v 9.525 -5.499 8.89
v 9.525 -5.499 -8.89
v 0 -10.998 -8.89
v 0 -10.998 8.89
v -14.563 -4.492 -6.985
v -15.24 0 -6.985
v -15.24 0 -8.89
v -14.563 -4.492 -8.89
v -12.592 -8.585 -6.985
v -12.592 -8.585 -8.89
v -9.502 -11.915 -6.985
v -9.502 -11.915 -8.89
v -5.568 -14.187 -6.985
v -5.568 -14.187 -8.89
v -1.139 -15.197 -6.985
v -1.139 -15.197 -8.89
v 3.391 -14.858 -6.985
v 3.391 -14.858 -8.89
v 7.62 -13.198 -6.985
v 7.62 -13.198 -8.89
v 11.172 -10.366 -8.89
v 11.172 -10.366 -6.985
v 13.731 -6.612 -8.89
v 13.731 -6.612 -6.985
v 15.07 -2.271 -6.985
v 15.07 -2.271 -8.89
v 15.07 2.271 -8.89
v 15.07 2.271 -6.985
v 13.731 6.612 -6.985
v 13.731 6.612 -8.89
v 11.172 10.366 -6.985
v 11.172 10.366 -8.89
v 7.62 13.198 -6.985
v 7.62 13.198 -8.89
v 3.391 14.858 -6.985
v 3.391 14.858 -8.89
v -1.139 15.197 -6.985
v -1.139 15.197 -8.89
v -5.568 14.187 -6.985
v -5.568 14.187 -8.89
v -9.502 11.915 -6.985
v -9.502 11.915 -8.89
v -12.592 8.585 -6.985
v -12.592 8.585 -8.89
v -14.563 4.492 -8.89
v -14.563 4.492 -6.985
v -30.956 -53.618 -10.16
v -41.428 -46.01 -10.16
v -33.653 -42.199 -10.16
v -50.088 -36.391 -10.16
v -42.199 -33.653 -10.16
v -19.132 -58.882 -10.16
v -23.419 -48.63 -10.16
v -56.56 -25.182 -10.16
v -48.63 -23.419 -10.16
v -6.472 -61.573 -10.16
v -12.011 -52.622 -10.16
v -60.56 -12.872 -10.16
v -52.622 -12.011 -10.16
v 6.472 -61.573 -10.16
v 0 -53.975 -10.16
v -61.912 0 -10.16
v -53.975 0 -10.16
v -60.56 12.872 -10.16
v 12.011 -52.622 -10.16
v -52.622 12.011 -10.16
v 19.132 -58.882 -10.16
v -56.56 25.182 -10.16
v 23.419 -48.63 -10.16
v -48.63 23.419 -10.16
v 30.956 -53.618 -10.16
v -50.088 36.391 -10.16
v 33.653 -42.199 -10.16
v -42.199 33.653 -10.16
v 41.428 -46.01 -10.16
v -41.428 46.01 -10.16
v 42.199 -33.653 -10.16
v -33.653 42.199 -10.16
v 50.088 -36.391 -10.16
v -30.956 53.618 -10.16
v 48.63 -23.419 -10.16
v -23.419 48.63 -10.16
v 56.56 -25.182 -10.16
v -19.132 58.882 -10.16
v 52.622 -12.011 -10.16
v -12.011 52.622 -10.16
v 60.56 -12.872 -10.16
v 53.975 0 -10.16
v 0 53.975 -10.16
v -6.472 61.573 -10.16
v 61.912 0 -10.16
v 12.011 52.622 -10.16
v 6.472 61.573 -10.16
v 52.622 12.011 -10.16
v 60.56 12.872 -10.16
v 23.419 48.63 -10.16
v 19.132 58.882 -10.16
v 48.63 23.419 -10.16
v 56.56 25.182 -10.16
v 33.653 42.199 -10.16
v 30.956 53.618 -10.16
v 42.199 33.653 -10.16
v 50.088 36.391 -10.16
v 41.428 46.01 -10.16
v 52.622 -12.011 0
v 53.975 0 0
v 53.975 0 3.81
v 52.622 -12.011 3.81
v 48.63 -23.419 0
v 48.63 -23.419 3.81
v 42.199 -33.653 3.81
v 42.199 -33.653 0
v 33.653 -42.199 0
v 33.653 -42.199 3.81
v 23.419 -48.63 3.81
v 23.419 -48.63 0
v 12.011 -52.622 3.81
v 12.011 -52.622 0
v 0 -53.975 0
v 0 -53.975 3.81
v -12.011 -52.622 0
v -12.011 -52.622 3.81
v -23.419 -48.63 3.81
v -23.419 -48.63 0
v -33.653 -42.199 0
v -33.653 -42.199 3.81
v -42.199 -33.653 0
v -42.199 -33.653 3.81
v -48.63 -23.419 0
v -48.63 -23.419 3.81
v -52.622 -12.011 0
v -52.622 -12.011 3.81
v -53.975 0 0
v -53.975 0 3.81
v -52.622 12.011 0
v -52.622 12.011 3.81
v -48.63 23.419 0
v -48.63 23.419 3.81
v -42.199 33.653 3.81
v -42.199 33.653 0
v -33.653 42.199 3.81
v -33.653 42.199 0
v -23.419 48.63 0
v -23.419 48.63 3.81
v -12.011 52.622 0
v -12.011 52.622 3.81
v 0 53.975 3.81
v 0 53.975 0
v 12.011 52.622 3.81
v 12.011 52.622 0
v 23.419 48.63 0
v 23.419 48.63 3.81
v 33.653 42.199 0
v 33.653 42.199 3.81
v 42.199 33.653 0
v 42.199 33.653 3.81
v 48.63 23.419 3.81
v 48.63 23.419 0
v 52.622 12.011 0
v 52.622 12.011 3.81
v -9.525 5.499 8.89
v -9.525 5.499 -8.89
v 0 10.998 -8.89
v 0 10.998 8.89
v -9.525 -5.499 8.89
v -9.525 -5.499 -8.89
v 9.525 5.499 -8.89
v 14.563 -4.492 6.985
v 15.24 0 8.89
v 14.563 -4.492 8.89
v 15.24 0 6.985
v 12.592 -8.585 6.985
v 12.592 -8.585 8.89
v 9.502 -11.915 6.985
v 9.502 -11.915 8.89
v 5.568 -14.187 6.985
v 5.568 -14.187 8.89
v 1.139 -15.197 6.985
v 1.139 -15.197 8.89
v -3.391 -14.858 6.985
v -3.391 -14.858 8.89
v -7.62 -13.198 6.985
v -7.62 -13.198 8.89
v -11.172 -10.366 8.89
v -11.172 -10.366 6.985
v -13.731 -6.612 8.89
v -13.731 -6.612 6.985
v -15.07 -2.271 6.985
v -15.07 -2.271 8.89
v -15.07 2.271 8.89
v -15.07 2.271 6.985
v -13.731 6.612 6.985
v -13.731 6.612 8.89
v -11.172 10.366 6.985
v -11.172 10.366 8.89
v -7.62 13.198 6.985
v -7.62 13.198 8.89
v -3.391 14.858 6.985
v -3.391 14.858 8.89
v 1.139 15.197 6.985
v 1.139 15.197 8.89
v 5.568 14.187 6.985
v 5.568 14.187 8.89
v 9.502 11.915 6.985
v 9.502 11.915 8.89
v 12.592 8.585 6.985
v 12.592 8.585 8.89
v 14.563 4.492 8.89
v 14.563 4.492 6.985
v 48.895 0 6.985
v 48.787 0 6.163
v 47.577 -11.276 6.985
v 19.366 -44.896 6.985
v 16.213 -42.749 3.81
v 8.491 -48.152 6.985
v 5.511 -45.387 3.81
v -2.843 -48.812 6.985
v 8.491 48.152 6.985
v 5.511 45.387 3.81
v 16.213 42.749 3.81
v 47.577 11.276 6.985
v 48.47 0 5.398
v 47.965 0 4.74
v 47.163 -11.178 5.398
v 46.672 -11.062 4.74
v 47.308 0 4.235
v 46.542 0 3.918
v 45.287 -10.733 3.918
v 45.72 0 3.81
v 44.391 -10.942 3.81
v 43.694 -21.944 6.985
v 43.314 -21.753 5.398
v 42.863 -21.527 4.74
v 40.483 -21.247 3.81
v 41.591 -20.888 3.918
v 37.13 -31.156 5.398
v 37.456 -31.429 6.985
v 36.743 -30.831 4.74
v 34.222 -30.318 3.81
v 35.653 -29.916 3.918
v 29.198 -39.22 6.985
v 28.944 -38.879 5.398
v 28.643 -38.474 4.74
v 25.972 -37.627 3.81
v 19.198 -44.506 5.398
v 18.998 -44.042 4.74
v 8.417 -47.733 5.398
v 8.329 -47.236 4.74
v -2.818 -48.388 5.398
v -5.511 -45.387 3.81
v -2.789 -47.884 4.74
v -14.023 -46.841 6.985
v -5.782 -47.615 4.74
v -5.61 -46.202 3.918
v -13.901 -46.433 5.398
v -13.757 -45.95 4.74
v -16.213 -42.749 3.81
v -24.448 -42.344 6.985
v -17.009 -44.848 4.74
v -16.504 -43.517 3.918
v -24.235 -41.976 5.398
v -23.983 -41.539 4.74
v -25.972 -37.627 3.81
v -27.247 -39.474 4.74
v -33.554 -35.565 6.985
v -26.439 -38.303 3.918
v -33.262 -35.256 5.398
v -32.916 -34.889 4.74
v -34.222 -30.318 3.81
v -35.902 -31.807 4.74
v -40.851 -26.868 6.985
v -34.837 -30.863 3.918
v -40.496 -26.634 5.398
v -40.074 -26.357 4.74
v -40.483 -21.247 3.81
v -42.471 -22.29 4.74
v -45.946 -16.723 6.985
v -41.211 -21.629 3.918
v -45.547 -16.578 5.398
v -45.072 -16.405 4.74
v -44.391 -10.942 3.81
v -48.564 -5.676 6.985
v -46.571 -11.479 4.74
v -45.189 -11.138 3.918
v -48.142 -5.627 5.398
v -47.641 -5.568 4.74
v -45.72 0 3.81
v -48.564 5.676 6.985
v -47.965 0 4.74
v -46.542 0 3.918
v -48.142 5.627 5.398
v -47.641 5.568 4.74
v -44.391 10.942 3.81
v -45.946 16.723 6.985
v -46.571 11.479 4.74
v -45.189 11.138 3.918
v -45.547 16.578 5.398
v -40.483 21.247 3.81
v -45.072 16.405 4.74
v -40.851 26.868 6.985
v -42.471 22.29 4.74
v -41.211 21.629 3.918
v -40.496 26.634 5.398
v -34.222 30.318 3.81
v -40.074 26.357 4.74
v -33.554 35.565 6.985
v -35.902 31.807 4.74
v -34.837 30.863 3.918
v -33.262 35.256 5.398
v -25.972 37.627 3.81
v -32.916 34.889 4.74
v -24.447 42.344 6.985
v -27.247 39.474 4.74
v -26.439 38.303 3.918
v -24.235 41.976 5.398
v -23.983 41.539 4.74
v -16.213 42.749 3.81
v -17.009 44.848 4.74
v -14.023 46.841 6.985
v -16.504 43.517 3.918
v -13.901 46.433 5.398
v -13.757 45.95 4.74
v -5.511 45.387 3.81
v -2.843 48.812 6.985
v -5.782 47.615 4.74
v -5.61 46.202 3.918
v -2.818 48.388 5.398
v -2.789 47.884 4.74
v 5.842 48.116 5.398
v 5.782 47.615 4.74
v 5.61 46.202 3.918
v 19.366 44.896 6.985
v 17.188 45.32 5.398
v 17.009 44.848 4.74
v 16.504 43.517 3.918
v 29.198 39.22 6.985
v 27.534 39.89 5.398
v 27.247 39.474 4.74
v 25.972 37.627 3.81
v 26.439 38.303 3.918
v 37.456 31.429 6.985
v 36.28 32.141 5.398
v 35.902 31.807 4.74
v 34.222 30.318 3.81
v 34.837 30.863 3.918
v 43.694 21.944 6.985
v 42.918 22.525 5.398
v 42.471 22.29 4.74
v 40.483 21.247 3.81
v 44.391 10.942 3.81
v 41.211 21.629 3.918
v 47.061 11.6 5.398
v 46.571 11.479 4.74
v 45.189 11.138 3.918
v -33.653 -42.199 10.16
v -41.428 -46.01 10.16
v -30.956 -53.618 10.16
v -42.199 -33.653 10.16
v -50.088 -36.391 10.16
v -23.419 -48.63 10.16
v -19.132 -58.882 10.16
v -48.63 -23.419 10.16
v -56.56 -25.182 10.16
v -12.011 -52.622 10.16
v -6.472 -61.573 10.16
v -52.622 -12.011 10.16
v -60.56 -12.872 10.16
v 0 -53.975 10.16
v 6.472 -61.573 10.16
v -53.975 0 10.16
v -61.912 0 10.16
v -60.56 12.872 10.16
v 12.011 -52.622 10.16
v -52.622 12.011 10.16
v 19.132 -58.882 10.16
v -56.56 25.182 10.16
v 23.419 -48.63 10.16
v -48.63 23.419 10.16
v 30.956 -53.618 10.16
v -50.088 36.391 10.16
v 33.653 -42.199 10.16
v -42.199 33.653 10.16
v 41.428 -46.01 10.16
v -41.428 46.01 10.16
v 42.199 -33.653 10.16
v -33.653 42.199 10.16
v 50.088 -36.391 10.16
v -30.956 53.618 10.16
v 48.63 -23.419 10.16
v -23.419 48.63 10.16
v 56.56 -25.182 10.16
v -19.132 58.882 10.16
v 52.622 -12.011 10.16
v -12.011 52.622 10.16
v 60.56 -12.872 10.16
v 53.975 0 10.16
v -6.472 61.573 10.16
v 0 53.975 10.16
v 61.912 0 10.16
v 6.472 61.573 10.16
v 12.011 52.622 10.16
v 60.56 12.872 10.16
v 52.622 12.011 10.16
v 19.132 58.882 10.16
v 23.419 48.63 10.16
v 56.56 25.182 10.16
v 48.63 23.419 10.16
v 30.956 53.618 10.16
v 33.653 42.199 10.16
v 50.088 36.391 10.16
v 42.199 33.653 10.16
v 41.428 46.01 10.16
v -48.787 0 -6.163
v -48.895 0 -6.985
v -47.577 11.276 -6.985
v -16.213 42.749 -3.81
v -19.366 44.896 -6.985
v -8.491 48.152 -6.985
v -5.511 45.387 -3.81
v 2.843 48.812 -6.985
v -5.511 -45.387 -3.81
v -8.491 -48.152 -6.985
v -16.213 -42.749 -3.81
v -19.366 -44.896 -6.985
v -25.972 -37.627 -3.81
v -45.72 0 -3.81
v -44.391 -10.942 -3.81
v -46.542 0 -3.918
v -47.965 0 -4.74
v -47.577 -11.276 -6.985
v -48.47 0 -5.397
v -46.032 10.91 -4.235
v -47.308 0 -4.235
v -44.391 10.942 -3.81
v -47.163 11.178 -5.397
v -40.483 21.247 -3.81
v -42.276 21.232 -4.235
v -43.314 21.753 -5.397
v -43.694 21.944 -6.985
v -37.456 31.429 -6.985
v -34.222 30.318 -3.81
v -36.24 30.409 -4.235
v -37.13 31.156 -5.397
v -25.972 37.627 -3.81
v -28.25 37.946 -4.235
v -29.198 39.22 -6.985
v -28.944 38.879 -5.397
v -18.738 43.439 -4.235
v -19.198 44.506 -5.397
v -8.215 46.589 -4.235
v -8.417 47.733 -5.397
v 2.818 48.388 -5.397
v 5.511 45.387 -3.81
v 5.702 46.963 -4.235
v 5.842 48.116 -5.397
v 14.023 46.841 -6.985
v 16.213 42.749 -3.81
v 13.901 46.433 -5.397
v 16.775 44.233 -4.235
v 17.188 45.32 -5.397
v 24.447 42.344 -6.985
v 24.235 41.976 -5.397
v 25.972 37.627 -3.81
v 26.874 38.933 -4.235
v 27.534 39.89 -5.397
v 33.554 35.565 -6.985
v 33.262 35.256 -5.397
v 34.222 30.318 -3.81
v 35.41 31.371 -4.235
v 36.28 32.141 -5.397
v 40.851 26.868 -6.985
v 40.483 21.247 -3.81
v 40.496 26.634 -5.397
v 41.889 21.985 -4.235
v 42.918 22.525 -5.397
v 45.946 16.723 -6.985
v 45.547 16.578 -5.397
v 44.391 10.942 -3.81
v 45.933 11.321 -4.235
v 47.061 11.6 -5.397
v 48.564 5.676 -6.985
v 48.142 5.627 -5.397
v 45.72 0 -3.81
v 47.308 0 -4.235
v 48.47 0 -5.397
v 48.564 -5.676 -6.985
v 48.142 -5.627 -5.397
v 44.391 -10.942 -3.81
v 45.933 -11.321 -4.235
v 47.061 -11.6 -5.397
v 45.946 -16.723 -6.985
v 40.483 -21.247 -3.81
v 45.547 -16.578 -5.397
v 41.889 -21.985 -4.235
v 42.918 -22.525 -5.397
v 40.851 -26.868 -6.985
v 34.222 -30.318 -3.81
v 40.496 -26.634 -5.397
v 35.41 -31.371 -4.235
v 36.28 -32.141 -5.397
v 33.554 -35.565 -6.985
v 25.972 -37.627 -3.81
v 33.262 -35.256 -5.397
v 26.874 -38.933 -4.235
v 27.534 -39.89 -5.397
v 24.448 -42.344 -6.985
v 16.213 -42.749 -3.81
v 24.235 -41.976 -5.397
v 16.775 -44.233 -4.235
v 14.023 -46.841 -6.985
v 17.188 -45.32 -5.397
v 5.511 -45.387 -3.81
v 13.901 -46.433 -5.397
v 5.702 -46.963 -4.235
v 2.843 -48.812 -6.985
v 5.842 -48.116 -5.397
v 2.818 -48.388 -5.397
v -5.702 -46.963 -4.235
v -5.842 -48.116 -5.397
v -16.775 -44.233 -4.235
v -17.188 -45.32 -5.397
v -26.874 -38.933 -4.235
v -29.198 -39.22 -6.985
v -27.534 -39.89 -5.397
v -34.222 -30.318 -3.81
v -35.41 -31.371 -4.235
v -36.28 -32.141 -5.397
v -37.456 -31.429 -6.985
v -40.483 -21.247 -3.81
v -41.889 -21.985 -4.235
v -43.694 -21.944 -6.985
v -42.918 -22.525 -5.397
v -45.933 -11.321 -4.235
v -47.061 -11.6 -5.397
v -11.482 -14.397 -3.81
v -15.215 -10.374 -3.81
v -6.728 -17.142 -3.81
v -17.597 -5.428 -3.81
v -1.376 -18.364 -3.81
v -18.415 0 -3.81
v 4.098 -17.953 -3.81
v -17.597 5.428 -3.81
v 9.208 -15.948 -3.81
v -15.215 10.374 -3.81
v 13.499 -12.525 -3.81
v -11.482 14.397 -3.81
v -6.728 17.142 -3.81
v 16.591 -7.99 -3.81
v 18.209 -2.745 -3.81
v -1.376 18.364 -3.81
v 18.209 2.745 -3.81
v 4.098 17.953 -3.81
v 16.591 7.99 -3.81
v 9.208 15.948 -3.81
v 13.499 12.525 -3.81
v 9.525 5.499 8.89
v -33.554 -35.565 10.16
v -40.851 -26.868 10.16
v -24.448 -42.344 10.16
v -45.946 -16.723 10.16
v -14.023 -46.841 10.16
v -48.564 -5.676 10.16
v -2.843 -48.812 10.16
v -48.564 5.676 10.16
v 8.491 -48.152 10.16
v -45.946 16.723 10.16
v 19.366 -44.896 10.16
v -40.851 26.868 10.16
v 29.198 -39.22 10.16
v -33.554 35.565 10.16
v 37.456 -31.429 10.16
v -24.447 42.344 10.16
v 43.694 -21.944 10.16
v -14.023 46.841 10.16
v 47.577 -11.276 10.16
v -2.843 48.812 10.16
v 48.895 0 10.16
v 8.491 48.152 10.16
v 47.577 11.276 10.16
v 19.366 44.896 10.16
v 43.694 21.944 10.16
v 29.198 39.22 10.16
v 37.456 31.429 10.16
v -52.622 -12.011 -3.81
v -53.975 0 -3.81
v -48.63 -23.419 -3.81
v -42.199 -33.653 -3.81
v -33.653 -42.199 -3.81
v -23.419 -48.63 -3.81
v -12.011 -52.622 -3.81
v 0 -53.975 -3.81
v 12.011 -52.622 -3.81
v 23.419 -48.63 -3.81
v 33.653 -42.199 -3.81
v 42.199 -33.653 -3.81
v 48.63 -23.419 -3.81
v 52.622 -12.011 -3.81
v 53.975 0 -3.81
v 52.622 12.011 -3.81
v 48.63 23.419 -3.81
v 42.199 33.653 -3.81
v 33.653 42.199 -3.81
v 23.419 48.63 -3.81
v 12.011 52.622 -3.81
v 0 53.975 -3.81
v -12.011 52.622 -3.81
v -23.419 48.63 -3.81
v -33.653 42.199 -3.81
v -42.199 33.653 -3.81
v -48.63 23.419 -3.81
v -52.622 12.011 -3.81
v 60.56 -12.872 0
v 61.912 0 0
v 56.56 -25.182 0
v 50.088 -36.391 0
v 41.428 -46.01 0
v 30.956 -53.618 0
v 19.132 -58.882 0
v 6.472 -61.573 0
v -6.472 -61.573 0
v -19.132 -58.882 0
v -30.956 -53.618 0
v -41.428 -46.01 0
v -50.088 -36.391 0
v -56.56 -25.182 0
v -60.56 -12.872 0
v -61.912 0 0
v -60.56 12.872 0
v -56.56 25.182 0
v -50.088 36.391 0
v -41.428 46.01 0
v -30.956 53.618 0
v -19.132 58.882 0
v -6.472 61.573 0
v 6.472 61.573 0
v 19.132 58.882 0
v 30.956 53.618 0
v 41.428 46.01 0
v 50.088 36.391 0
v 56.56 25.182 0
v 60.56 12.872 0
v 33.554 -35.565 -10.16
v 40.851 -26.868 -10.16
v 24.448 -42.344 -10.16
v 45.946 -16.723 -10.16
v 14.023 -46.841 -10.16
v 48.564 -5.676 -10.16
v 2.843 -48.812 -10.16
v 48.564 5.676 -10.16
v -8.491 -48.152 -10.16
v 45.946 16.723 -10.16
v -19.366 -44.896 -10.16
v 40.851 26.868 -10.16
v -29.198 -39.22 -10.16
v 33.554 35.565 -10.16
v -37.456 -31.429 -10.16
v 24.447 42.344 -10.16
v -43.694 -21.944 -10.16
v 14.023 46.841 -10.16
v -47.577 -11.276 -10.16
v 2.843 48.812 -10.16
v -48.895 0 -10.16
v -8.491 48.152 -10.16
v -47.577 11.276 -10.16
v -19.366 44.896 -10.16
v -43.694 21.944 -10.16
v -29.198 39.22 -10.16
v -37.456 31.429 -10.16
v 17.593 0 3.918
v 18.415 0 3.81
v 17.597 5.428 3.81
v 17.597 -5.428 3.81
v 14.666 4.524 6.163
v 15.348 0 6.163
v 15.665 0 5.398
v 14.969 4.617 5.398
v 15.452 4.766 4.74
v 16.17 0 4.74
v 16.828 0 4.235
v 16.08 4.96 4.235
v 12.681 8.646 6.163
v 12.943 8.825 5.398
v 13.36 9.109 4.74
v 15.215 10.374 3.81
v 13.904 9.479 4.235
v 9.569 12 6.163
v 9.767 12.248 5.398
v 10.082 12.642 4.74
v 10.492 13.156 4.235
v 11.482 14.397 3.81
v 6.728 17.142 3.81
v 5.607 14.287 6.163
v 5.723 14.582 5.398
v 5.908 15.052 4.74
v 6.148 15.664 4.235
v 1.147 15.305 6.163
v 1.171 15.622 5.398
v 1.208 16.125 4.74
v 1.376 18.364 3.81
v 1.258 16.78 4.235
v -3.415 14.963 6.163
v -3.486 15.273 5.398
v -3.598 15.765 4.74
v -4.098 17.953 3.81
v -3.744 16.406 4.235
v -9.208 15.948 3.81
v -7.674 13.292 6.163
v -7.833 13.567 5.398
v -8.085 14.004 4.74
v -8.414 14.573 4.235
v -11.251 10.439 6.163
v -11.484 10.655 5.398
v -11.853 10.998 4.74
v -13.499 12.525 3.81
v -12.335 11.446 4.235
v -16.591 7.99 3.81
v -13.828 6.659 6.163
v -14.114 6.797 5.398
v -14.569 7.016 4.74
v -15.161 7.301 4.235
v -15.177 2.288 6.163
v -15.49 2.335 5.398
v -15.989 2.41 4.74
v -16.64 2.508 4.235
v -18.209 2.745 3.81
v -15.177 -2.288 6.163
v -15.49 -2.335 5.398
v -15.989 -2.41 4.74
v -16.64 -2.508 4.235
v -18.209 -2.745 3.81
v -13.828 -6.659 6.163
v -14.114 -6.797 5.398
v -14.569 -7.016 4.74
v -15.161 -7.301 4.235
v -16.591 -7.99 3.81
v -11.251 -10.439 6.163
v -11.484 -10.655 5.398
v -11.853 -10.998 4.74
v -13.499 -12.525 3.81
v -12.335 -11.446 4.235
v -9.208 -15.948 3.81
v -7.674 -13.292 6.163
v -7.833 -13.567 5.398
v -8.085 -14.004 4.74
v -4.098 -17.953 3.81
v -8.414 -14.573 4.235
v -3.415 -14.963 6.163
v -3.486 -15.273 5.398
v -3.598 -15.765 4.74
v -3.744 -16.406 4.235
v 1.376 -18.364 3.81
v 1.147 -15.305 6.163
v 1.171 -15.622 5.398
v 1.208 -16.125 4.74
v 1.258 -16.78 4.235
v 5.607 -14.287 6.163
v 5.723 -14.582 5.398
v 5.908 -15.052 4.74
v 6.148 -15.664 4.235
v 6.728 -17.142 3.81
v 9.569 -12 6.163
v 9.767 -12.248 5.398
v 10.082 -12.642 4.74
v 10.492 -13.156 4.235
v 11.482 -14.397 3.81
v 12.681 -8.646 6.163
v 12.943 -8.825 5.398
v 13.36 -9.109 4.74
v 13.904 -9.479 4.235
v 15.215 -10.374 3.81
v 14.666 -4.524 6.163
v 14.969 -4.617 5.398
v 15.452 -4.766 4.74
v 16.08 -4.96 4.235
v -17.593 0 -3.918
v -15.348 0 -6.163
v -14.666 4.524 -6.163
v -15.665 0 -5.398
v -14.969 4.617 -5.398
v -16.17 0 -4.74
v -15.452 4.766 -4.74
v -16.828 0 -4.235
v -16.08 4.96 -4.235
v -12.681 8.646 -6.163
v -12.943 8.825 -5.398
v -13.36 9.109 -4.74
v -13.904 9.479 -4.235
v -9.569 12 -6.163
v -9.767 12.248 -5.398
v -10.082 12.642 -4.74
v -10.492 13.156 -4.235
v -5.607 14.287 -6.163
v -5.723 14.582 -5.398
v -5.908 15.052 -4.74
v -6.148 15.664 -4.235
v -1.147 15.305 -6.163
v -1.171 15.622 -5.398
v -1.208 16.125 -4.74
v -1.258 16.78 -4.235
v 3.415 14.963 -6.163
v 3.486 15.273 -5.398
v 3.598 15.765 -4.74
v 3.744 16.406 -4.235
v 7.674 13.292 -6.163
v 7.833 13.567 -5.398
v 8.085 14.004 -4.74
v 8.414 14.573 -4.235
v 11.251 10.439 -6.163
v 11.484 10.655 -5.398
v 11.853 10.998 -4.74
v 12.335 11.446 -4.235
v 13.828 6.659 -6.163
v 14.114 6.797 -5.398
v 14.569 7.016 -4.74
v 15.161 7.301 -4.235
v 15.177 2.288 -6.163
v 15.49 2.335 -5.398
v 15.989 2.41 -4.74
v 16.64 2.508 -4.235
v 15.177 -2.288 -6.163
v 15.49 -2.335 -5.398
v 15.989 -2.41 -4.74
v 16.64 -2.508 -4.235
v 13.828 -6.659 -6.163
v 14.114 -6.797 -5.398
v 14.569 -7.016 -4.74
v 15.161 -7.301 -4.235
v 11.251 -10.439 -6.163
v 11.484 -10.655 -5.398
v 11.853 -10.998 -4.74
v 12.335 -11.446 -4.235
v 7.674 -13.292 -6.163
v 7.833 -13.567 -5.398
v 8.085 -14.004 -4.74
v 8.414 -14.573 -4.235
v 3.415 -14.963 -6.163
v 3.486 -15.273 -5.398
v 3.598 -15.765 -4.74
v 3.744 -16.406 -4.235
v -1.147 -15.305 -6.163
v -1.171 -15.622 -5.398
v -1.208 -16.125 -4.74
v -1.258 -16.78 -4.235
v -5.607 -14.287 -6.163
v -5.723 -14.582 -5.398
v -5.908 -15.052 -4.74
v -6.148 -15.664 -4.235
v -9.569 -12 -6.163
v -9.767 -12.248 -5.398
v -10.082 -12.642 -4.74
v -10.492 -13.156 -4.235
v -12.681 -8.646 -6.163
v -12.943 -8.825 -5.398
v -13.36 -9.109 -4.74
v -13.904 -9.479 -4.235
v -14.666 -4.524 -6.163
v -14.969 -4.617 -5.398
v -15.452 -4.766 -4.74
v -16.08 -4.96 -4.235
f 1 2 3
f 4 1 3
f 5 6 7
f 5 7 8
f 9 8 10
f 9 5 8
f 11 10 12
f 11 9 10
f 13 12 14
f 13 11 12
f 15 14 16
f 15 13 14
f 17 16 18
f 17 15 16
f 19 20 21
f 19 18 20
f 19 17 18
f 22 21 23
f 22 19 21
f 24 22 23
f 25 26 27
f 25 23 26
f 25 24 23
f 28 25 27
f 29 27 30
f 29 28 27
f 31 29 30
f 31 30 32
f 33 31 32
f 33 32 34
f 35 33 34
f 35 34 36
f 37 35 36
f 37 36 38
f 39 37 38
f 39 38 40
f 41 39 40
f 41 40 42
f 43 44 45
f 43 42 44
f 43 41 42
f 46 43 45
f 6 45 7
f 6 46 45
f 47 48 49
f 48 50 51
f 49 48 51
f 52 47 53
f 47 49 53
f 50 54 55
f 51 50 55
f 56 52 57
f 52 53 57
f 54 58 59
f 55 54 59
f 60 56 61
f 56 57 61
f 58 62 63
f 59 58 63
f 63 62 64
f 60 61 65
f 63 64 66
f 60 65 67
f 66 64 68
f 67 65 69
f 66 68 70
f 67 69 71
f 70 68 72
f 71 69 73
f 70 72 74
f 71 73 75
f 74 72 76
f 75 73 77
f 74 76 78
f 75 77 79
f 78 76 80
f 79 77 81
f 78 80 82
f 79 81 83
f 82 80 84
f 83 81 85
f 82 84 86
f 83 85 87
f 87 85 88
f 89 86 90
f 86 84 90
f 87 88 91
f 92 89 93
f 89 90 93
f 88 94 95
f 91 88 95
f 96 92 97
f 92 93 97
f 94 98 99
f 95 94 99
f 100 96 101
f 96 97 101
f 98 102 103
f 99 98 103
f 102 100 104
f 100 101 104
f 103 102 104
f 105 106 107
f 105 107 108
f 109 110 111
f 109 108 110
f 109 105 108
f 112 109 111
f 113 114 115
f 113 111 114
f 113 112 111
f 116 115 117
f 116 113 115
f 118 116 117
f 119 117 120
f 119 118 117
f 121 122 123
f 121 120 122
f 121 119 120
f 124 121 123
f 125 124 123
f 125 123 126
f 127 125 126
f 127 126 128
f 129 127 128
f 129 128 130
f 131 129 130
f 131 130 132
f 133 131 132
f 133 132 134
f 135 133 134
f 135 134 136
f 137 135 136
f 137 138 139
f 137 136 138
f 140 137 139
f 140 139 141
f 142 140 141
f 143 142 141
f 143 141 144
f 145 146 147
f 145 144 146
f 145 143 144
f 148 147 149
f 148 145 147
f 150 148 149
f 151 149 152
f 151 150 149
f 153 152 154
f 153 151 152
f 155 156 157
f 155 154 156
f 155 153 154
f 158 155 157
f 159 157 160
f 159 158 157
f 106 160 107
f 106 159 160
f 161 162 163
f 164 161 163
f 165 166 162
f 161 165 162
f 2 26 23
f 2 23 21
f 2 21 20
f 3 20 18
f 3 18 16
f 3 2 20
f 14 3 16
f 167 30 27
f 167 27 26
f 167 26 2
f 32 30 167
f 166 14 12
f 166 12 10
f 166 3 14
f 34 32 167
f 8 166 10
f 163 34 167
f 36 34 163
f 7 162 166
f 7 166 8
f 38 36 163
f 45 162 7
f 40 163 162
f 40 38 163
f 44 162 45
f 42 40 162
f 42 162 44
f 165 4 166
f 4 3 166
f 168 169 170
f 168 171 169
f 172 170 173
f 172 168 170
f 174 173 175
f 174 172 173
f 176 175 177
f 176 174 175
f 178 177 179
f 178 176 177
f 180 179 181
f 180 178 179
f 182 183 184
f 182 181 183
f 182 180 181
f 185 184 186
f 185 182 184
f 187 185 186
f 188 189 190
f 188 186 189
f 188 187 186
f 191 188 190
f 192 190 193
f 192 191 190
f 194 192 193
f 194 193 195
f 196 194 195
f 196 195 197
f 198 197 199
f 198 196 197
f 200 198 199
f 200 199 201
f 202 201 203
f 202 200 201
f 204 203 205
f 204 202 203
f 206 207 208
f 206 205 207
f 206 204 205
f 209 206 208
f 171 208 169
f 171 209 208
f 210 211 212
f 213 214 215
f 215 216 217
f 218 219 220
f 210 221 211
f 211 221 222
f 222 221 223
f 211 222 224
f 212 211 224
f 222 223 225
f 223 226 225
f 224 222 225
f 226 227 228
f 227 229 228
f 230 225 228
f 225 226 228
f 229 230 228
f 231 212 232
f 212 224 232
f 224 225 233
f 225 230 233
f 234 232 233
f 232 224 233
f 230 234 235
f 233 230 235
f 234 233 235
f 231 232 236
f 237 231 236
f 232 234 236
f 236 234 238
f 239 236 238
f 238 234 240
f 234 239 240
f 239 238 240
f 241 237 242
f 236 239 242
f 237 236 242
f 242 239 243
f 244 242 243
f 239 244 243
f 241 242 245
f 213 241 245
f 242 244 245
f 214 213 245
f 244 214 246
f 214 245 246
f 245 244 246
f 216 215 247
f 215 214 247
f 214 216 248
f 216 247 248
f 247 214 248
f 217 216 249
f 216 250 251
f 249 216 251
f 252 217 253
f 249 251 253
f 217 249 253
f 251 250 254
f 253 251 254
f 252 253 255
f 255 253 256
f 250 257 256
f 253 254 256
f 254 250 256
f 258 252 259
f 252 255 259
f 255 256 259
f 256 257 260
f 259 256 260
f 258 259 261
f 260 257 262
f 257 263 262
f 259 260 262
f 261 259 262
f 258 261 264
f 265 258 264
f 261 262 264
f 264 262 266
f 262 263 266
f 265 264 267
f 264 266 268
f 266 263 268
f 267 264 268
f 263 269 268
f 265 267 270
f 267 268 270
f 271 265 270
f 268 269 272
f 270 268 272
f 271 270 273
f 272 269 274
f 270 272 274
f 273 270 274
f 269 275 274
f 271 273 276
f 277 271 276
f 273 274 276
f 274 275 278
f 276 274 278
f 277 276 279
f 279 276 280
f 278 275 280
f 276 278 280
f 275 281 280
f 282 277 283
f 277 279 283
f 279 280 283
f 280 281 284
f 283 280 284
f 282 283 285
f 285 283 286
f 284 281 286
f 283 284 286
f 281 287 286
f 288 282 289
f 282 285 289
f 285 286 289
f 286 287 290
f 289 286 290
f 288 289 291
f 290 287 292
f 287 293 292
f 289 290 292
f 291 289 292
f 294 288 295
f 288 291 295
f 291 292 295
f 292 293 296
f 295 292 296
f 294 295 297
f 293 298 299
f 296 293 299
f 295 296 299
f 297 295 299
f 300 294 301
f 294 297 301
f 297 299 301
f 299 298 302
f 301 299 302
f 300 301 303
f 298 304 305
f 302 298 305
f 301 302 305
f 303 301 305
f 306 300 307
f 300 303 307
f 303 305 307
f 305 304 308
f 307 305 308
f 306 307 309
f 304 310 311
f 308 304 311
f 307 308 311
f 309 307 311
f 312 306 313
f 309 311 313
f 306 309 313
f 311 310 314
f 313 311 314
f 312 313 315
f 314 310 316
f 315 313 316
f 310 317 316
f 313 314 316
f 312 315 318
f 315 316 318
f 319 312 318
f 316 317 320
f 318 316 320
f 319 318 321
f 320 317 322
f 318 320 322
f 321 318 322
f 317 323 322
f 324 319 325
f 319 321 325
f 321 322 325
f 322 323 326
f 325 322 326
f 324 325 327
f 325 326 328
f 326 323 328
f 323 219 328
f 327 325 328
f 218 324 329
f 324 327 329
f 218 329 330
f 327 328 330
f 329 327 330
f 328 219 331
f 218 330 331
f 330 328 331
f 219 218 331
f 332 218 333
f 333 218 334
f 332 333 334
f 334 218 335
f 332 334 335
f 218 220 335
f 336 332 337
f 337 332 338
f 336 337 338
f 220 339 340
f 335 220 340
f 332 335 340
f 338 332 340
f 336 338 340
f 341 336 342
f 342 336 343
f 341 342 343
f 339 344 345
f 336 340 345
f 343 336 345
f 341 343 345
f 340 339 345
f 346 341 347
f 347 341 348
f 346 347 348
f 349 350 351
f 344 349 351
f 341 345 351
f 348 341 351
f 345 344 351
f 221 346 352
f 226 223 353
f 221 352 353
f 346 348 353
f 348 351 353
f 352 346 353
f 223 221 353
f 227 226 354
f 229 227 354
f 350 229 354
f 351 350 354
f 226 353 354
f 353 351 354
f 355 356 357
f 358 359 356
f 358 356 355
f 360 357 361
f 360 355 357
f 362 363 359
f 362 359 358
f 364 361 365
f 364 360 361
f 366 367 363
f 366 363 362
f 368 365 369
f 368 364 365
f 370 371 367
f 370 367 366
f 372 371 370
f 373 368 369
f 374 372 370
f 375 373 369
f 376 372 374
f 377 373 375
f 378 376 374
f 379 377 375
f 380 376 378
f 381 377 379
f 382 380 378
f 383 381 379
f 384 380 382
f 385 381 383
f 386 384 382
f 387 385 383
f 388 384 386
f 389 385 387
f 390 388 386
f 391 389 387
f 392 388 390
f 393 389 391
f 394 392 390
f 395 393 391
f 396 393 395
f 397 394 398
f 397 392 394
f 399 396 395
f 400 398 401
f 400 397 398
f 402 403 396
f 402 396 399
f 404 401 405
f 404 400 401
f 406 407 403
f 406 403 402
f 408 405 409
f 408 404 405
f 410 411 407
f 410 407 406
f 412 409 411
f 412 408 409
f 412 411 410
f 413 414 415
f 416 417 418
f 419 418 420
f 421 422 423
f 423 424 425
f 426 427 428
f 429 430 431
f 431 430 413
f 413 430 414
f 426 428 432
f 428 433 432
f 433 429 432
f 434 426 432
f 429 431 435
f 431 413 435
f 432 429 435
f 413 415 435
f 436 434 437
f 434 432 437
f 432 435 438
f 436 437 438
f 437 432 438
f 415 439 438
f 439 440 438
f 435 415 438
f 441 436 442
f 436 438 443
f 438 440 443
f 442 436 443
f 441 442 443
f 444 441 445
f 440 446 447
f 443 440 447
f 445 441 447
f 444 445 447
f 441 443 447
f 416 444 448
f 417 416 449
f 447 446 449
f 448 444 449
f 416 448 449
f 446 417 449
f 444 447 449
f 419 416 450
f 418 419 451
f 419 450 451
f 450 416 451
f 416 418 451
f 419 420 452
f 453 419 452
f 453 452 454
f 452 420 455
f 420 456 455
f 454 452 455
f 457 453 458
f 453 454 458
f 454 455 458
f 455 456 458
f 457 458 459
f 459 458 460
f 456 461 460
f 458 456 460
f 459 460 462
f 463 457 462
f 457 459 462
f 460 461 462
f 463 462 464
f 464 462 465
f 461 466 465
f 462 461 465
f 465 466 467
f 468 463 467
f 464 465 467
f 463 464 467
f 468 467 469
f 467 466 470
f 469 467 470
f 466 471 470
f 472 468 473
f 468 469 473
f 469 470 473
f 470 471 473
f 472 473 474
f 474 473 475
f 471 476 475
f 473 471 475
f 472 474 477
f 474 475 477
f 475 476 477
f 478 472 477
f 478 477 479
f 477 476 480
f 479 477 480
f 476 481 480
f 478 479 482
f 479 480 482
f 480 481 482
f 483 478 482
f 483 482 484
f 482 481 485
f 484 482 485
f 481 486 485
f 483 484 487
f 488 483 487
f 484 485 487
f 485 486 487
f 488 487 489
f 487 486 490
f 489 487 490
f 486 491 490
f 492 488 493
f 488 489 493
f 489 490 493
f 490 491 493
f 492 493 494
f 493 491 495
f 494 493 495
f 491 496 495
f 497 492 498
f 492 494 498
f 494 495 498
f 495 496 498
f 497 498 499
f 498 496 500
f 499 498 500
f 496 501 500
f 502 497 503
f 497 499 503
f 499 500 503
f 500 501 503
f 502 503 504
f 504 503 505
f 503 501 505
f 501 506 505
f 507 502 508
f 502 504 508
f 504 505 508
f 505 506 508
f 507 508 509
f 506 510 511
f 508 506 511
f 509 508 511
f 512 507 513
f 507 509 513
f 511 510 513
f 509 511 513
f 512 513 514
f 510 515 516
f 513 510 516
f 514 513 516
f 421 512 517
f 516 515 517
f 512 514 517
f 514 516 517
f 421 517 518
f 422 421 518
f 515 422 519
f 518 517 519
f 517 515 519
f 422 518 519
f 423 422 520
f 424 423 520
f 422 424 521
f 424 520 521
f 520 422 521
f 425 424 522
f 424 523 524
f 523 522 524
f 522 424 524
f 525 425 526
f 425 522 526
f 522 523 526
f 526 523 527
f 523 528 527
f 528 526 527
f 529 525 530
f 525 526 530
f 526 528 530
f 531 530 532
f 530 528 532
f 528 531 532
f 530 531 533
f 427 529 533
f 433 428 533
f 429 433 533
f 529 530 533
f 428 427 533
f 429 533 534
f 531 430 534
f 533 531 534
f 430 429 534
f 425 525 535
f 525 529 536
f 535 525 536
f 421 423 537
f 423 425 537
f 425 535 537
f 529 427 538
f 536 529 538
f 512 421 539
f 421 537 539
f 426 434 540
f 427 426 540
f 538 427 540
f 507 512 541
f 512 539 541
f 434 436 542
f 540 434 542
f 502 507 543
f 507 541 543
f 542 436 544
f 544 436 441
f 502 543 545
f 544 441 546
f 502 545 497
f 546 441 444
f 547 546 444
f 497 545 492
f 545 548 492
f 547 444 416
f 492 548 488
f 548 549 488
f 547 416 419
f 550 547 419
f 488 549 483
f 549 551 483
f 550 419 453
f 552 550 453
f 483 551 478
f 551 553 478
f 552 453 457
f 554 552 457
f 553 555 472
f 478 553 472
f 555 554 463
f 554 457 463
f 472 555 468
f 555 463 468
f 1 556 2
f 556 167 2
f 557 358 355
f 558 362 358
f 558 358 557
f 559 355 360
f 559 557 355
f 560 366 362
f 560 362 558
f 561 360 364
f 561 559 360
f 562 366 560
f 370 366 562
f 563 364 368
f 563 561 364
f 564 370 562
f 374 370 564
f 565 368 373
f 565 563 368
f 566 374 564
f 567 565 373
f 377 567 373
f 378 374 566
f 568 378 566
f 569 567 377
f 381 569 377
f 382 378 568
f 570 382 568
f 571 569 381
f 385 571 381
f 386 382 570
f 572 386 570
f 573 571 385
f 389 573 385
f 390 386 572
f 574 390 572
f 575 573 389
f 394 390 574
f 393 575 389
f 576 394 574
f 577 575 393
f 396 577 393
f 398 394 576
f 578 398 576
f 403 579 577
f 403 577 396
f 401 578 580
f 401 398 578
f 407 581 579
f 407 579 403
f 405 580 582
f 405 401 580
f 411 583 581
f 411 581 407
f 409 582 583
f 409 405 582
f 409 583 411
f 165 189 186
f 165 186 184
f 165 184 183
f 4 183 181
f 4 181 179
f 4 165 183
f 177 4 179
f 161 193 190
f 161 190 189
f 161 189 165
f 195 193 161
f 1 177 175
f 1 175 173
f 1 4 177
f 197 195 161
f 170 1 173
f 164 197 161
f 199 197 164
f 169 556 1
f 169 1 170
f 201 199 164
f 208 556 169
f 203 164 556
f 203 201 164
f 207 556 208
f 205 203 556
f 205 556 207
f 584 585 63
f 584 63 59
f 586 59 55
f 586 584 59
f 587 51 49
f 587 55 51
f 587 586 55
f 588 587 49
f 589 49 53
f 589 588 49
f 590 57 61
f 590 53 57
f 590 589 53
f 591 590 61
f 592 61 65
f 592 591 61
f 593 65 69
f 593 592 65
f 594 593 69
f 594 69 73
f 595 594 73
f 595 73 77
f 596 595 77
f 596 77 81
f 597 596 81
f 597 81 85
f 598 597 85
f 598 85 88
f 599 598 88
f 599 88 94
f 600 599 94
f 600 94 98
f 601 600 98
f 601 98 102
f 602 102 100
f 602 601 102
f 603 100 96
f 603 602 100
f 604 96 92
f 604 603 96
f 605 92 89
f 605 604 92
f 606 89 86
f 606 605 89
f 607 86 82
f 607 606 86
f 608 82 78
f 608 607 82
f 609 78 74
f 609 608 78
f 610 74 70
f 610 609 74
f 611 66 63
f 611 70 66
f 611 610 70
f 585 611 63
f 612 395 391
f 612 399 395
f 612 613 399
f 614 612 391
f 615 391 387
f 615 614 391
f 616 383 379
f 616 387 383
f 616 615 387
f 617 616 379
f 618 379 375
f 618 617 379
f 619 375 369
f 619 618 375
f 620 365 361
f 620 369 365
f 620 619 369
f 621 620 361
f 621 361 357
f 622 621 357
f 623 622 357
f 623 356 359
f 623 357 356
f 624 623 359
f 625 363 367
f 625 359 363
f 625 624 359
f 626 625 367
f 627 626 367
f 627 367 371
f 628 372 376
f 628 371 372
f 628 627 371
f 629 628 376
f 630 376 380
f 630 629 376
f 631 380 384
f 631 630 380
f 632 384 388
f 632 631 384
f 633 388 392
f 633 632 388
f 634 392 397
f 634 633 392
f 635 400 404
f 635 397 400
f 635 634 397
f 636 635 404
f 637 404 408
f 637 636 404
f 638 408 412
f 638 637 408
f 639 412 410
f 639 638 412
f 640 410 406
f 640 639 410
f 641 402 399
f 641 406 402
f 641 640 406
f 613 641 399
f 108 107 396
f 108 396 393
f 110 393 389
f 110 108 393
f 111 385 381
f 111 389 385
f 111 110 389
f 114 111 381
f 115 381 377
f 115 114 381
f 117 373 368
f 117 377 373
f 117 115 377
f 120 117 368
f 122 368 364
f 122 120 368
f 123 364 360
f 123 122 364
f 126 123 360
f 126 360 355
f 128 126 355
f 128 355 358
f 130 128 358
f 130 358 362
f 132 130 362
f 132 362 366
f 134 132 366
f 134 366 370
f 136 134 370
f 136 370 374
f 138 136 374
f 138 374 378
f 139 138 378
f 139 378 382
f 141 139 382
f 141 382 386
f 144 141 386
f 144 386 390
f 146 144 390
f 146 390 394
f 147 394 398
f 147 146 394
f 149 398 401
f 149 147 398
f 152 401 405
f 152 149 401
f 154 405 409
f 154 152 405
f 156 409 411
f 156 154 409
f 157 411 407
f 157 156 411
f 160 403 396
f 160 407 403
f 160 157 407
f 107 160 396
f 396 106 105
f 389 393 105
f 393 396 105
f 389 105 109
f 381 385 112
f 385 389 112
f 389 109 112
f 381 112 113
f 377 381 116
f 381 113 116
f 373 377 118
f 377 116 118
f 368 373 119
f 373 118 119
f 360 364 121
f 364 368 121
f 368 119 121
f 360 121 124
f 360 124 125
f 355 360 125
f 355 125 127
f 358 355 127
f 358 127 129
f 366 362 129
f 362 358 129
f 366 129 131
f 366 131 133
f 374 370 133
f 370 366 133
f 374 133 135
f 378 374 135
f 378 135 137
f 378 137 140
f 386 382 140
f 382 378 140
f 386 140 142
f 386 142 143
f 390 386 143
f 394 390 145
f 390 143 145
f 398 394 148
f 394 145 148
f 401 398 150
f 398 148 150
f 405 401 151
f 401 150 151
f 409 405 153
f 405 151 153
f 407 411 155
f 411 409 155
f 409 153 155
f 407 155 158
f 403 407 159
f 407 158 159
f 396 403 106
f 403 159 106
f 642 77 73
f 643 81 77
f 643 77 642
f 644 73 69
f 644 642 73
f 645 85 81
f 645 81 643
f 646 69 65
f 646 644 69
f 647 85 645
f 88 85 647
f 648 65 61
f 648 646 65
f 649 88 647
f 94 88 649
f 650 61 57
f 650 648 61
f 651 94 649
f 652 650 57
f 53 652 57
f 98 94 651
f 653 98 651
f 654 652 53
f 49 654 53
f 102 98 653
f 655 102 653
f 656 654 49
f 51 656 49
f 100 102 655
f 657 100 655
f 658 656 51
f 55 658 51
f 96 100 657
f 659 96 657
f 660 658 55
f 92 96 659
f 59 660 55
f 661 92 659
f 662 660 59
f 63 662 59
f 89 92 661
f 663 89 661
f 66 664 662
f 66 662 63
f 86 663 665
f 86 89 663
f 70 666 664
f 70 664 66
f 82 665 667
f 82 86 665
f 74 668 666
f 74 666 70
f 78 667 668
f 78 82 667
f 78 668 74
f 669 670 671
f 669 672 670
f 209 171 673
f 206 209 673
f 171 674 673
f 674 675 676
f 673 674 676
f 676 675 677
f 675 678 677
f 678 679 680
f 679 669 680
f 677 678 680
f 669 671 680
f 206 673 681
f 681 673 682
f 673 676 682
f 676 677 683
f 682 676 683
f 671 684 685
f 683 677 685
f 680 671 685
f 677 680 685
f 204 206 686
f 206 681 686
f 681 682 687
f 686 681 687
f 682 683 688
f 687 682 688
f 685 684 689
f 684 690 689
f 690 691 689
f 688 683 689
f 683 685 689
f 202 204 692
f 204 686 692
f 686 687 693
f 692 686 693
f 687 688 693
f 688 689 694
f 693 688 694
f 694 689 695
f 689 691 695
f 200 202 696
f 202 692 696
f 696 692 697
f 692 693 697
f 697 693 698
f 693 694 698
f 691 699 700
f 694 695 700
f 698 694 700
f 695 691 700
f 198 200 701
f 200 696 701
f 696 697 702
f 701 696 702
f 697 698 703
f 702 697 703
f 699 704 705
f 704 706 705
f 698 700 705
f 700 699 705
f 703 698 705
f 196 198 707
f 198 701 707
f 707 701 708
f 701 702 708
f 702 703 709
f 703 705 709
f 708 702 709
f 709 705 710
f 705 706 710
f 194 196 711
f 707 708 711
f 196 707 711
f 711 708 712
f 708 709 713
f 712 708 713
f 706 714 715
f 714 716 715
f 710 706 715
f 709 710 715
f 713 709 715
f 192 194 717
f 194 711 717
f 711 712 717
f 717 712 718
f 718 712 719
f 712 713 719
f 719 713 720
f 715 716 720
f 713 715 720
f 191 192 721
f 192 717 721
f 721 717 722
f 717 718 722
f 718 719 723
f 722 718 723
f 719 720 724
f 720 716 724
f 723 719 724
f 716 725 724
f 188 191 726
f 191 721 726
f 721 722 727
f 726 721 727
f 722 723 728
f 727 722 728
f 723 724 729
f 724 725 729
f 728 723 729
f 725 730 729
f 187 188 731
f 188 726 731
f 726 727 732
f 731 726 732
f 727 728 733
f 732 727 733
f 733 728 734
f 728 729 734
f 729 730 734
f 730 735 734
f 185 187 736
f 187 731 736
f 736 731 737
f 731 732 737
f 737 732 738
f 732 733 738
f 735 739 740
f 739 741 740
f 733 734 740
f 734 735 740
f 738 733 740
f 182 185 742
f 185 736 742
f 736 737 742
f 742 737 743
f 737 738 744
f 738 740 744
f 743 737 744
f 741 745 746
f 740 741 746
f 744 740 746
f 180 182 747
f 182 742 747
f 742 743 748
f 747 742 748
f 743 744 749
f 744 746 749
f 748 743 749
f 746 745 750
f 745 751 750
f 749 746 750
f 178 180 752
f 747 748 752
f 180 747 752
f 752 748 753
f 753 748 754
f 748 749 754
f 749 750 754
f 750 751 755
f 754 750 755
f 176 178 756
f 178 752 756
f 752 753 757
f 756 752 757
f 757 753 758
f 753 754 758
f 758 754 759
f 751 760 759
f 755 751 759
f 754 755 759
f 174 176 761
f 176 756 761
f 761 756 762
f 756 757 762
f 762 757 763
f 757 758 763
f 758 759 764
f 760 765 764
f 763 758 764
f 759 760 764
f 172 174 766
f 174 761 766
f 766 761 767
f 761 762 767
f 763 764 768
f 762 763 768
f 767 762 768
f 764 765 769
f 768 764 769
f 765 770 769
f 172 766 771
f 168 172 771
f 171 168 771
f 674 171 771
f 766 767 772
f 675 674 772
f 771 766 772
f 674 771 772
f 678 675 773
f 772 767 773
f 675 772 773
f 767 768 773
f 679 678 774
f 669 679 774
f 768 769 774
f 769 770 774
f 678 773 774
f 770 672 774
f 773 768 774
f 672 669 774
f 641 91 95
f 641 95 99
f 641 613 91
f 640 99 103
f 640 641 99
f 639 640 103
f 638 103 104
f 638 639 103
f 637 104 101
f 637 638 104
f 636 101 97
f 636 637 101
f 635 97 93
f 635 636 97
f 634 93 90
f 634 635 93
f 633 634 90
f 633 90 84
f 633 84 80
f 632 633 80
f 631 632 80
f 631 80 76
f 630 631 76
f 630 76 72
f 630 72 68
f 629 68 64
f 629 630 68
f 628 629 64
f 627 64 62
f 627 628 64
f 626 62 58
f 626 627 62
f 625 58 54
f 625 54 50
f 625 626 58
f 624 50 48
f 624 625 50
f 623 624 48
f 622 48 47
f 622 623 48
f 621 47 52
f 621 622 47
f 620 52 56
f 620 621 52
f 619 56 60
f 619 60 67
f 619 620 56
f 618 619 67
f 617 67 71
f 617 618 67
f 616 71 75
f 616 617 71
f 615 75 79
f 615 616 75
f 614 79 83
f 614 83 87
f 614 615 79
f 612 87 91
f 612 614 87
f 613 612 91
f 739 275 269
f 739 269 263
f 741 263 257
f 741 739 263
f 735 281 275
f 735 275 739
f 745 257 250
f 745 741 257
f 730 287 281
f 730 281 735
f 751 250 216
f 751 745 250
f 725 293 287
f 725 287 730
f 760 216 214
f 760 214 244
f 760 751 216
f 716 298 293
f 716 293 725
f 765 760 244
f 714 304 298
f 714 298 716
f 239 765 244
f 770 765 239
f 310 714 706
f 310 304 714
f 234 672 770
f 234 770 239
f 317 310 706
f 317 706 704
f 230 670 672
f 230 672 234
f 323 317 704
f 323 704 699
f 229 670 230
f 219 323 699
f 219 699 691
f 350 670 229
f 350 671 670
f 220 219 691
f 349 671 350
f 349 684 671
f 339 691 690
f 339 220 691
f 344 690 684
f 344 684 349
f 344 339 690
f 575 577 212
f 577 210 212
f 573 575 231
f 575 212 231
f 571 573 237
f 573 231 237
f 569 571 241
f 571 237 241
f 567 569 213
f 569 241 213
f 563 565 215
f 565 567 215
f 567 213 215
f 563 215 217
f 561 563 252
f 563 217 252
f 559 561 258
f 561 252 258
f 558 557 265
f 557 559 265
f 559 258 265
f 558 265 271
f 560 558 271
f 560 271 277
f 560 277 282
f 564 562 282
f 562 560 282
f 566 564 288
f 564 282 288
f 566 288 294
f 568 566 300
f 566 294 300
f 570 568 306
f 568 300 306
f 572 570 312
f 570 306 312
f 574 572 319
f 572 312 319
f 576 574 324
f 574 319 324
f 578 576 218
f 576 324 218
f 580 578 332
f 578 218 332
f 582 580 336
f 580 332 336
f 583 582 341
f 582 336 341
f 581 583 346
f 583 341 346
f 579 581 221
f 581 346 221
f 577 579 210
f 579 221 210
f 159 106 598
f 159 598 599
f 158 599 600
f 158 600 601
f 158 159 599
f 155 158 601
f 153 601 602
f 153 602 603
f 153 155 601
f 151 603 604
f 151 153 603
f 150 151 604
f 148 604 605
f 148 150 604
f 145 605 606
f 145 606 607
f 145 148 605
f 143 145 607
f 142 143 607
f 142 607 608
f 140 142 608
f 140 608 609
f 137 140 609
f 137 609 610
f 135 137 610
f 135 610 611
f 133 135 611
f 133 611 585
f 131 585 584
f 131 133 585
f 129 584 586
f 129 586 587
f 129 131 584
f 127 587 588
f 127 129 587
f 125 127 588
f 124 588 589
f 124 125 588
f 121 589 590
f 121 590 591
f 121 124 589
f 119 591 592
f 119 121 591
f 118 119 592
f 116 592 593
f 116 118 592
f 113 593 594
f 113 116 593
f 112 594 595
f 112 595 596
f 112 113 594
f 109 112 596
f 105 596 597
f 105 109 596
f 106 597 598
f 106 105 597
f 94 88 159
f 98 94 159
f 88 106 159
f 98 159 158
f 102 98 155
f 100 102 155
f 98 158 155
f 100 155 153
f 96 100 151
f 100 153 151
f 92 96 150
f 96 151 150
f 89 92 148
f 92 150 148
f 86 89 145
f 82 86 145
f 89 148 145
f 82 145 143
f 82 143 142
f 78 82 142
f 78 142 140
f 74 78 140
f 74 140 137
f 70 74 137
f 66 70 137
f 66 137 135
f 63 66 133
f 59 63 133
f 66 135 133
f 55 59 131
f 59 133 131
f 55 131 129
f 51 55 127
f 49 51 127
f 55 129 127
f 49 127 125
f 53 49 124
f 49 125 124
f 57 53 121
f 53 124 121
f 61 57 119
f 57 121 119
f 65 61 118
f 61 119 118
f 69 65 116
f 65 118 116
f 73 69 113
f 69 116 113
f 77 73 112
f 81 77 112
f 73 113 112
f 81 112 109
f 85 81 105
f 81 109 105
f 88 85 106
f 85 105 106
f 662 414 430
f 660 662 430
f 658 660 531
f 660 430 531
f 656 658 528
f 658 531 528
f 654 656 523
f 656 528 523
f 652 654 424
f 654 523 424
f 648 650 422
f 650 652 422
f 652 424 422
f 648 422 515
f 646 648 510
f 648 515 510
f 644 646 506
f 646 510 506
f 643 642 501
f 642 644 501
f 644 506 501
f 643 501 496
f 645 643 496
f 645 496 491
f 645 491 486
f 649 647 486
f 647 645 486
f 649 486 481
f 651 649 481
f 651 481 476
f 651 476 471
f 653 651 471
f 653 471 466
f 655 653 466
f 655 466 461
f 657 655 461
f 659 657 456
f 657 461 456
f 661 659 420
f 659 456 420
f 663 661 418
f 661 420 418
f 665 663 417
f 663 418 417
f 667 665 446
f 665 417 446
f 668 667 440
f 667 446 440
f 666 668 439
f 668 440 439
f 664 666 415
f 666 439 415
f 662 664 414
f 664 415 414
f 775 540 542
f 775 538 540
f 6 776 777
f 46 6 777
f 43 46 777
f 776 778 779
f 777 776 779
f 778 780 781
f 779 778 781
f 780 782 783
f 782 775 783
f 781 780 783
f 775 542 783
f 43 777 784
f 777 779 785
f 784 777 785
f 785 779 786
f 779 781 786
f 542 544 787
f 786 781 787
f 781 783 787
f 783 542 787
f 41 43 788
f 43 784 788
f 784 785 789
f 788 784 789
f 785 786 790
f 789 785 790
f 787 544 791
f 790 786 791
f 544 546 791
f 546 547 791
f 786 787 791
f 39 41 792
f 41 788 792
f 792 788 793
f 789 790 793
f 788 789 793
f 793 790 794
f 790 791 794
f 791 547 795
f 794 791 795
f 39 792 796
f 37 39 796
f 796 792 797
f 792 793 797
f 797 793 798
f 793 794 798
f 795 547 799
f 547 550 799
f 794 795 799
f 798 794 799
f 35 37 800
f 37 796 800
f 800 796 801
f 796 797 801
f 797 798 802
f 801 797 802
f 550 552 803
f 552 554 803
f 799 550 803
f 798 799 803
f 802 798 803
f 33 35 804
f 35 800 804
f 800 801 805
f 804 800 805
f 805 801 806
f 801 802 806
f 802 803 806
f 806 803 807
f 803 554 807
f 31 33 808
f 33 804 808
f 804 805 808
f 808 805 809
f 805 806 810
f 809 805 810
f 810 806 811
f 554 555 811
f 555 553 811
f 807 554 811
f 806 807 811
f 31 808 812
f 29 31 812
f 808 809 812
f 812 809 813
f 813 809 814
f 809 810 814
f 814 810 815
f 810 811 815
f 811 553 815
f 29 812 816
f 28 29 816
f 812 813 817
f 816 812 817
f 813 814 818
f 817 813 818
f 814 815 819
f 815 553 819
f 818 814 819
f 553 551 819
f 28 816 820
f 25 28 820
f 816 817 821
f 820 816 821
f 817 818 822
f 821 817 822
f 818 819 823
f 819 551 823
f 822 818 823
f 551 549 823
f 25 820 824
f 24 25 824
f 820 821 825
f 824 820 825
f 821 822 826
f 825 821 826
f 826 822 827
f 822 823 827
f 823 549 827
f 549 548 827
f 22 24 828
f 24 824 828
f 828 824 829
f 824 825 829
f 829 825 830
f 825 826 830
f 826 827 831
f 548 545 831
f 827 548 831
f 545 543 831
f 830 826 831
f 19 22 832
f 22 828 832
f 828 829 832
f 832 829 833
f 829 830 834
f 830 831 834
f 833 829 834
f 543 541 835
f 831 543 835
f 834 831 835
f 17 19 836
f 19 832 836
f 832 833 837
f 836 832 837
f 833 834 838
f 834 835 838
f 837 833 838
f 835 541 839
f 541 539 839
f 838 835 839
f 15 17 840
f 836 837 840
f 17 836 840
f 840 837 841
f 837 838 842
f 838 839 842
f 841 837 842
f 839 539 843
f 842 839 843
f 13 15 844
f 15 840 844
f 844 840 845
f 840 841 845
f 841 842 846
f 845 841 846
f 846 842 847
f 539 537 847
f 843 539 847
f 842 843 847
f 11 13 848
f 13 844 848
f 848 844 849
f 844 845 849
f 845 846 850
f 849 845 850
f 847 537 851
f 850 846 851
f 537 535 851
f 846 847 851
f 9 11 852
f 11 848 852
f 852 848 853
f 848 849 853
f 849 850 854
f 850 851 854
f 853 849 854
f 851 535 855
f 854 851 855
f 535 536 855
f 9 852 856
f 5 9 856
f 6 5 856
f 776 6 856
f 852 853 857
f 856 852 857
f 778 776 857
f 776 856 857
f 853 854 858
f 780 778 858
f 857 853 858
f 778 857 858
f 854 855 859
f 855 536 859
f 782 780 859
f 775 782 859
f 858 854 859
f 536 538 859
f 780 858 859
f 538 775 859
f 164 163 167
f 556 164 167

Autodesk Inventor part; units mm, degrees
ref_plane "YZ Plane" through (0, 0, 0) normal (1, 0, 0) x (0, 1, 0)
ref_plane "XZ Plane" through (0, 0, 0) normal (0, 1, 0) x (-1, 0, 0)
ref_plane "XY Plane" through (0, 0, 0) normal (0, 0, 1) x (1, 0, 0)
sketch "Sketch1" plane through (0, 0, 0) normal (0, 0, 1) x (1, 0, 0)
  line L0 (9.525, 5.4993) -> (9.525, -5.4993)
  line L1 (9.525, -5.4993) -> (0, -10.9985)
  line L2 (0, -10.9985) -> (-9.525, -5.4993)
  line L3 (-9.525, -5.4993) -> (-9.525, 5.4993)
  line L4 (-9.525, 5.4993) -> (0, 10.9985)
  line L5 (0, 10.9985) -> (9.525, 5.4993)
  circle A0 centre (0, 0) radius 53.975
  dimension "d0" = 19.05
  dimension "d1" = 107.95
extrude "Extrusion1" add sketch "Sketch1" along normal mid plane 7.62
sketch "Sketch3" plane through (0, 0, -3.81) normal (0, 0, -1) x (-1, 0, 0)
  circle A0 centre (0, 0) radius 53.975 projected
  circle A1 centre (0, 0) radius 48.895
  dimension "d7" = 5.08
extrude "Extrusion3" add sketch "Sketch3" along normal blind 6.35
sketch "Sketch4" plane through (0, 0, 3.81) normal (0, 0, 1) x (1, 0, 0)
  circle A0 centre (0, 0) radius 53.975 projected
  circle A1 centre (0, 0) radius 48.895
  dimension "d10" = 5.08
extrude "Extrusion4" add sketch "Sketch4" along normal blind 6.35
fillet "Fillet1" radius 3.175 1 edges at (-48.895, 0, 3.81)
fillet "Fillet2" radius 3.175 1 edges at (48.895, 0, -3.81)
sketch "Sketch5" plane through (0, 0, -3.81) normal (0, 0, -1) x (-1, 0, 0)
  line L0 (0, -10.9985) -> (-9.525, -5.4993) projected
  line L1 (-9.525, -5.4993) -> (-9.525, 5.4993) projected
  line L2 (-9.525, 5.4993) -> (0, 10.9985) projected
  line L3 (0, 10.9985) -> (9.525, 5.4993) projected
  line L4 (9.525, 5.4993) -> (9.525, -5.4993) projected
  line L5 (9.525, -5.4993) -> (0, -10.9985) projected
  circle A0 centre (0, 0) radius 45.72 projected
  circle A1 centre (0, 0) radius 15.24
  dimension "d15" = 30.48
extrude "Extrusion5" add sketch "Sketch5" along normal blind 5.08 contours A1
fillet "Fillet3" radius 3.175 1 edges at (15.24, 0, -3.81)
sketch "Sketch6" plane through (0, 0, 3.81) normal (0, 0, 1) x (1, 0, 0)
  line L0 (9.525, -5.4993) -> (0, -10.9985) projected
  line L1 (0, -10.9985) -> (-9.525, -5.4993) projected
  line L2 (-9.525, -5.4993) -> (-9.525, 5.4993) projected
  line L3 (-9.525, 5.4993) -> (0, 10.9985) projected
  line L4 (0, 10.9985) -> (9.525, 5.4993) projected
  line L5 (9.525, 5.4993) -> (9.525, -5.4993) projected
  circle A0 centre (0, 0) radius 45.72 projected
  circle A1 centre (0, 0) radius 15.24
  dimension "d19" = 30.48
extrude "Extrusion6" add sketch "Sketch6" along normal blind 5.08 contours A1
fillet "Fillet4" radius 3.175 1 edges at (-15.24, 0, 3.81)
sketch "Sketch7" plane through (0, 0, 0) normal (0, 0, 1) x (1, 0, 0)
  circle A0 centre (0, 0) radius 61.9125
  circle A1 centre (0, 0) radius 53.975
  circle A2 centre (0, 0) radius 53.975 projected
  dimension "d23" = 123.825
extrude "Extrusion7" add sketch "Sketch7" along normal mid plane 20.32 separate body
properties part number "T80P-494BO-HS6" material "PC_ABS Plastic"
